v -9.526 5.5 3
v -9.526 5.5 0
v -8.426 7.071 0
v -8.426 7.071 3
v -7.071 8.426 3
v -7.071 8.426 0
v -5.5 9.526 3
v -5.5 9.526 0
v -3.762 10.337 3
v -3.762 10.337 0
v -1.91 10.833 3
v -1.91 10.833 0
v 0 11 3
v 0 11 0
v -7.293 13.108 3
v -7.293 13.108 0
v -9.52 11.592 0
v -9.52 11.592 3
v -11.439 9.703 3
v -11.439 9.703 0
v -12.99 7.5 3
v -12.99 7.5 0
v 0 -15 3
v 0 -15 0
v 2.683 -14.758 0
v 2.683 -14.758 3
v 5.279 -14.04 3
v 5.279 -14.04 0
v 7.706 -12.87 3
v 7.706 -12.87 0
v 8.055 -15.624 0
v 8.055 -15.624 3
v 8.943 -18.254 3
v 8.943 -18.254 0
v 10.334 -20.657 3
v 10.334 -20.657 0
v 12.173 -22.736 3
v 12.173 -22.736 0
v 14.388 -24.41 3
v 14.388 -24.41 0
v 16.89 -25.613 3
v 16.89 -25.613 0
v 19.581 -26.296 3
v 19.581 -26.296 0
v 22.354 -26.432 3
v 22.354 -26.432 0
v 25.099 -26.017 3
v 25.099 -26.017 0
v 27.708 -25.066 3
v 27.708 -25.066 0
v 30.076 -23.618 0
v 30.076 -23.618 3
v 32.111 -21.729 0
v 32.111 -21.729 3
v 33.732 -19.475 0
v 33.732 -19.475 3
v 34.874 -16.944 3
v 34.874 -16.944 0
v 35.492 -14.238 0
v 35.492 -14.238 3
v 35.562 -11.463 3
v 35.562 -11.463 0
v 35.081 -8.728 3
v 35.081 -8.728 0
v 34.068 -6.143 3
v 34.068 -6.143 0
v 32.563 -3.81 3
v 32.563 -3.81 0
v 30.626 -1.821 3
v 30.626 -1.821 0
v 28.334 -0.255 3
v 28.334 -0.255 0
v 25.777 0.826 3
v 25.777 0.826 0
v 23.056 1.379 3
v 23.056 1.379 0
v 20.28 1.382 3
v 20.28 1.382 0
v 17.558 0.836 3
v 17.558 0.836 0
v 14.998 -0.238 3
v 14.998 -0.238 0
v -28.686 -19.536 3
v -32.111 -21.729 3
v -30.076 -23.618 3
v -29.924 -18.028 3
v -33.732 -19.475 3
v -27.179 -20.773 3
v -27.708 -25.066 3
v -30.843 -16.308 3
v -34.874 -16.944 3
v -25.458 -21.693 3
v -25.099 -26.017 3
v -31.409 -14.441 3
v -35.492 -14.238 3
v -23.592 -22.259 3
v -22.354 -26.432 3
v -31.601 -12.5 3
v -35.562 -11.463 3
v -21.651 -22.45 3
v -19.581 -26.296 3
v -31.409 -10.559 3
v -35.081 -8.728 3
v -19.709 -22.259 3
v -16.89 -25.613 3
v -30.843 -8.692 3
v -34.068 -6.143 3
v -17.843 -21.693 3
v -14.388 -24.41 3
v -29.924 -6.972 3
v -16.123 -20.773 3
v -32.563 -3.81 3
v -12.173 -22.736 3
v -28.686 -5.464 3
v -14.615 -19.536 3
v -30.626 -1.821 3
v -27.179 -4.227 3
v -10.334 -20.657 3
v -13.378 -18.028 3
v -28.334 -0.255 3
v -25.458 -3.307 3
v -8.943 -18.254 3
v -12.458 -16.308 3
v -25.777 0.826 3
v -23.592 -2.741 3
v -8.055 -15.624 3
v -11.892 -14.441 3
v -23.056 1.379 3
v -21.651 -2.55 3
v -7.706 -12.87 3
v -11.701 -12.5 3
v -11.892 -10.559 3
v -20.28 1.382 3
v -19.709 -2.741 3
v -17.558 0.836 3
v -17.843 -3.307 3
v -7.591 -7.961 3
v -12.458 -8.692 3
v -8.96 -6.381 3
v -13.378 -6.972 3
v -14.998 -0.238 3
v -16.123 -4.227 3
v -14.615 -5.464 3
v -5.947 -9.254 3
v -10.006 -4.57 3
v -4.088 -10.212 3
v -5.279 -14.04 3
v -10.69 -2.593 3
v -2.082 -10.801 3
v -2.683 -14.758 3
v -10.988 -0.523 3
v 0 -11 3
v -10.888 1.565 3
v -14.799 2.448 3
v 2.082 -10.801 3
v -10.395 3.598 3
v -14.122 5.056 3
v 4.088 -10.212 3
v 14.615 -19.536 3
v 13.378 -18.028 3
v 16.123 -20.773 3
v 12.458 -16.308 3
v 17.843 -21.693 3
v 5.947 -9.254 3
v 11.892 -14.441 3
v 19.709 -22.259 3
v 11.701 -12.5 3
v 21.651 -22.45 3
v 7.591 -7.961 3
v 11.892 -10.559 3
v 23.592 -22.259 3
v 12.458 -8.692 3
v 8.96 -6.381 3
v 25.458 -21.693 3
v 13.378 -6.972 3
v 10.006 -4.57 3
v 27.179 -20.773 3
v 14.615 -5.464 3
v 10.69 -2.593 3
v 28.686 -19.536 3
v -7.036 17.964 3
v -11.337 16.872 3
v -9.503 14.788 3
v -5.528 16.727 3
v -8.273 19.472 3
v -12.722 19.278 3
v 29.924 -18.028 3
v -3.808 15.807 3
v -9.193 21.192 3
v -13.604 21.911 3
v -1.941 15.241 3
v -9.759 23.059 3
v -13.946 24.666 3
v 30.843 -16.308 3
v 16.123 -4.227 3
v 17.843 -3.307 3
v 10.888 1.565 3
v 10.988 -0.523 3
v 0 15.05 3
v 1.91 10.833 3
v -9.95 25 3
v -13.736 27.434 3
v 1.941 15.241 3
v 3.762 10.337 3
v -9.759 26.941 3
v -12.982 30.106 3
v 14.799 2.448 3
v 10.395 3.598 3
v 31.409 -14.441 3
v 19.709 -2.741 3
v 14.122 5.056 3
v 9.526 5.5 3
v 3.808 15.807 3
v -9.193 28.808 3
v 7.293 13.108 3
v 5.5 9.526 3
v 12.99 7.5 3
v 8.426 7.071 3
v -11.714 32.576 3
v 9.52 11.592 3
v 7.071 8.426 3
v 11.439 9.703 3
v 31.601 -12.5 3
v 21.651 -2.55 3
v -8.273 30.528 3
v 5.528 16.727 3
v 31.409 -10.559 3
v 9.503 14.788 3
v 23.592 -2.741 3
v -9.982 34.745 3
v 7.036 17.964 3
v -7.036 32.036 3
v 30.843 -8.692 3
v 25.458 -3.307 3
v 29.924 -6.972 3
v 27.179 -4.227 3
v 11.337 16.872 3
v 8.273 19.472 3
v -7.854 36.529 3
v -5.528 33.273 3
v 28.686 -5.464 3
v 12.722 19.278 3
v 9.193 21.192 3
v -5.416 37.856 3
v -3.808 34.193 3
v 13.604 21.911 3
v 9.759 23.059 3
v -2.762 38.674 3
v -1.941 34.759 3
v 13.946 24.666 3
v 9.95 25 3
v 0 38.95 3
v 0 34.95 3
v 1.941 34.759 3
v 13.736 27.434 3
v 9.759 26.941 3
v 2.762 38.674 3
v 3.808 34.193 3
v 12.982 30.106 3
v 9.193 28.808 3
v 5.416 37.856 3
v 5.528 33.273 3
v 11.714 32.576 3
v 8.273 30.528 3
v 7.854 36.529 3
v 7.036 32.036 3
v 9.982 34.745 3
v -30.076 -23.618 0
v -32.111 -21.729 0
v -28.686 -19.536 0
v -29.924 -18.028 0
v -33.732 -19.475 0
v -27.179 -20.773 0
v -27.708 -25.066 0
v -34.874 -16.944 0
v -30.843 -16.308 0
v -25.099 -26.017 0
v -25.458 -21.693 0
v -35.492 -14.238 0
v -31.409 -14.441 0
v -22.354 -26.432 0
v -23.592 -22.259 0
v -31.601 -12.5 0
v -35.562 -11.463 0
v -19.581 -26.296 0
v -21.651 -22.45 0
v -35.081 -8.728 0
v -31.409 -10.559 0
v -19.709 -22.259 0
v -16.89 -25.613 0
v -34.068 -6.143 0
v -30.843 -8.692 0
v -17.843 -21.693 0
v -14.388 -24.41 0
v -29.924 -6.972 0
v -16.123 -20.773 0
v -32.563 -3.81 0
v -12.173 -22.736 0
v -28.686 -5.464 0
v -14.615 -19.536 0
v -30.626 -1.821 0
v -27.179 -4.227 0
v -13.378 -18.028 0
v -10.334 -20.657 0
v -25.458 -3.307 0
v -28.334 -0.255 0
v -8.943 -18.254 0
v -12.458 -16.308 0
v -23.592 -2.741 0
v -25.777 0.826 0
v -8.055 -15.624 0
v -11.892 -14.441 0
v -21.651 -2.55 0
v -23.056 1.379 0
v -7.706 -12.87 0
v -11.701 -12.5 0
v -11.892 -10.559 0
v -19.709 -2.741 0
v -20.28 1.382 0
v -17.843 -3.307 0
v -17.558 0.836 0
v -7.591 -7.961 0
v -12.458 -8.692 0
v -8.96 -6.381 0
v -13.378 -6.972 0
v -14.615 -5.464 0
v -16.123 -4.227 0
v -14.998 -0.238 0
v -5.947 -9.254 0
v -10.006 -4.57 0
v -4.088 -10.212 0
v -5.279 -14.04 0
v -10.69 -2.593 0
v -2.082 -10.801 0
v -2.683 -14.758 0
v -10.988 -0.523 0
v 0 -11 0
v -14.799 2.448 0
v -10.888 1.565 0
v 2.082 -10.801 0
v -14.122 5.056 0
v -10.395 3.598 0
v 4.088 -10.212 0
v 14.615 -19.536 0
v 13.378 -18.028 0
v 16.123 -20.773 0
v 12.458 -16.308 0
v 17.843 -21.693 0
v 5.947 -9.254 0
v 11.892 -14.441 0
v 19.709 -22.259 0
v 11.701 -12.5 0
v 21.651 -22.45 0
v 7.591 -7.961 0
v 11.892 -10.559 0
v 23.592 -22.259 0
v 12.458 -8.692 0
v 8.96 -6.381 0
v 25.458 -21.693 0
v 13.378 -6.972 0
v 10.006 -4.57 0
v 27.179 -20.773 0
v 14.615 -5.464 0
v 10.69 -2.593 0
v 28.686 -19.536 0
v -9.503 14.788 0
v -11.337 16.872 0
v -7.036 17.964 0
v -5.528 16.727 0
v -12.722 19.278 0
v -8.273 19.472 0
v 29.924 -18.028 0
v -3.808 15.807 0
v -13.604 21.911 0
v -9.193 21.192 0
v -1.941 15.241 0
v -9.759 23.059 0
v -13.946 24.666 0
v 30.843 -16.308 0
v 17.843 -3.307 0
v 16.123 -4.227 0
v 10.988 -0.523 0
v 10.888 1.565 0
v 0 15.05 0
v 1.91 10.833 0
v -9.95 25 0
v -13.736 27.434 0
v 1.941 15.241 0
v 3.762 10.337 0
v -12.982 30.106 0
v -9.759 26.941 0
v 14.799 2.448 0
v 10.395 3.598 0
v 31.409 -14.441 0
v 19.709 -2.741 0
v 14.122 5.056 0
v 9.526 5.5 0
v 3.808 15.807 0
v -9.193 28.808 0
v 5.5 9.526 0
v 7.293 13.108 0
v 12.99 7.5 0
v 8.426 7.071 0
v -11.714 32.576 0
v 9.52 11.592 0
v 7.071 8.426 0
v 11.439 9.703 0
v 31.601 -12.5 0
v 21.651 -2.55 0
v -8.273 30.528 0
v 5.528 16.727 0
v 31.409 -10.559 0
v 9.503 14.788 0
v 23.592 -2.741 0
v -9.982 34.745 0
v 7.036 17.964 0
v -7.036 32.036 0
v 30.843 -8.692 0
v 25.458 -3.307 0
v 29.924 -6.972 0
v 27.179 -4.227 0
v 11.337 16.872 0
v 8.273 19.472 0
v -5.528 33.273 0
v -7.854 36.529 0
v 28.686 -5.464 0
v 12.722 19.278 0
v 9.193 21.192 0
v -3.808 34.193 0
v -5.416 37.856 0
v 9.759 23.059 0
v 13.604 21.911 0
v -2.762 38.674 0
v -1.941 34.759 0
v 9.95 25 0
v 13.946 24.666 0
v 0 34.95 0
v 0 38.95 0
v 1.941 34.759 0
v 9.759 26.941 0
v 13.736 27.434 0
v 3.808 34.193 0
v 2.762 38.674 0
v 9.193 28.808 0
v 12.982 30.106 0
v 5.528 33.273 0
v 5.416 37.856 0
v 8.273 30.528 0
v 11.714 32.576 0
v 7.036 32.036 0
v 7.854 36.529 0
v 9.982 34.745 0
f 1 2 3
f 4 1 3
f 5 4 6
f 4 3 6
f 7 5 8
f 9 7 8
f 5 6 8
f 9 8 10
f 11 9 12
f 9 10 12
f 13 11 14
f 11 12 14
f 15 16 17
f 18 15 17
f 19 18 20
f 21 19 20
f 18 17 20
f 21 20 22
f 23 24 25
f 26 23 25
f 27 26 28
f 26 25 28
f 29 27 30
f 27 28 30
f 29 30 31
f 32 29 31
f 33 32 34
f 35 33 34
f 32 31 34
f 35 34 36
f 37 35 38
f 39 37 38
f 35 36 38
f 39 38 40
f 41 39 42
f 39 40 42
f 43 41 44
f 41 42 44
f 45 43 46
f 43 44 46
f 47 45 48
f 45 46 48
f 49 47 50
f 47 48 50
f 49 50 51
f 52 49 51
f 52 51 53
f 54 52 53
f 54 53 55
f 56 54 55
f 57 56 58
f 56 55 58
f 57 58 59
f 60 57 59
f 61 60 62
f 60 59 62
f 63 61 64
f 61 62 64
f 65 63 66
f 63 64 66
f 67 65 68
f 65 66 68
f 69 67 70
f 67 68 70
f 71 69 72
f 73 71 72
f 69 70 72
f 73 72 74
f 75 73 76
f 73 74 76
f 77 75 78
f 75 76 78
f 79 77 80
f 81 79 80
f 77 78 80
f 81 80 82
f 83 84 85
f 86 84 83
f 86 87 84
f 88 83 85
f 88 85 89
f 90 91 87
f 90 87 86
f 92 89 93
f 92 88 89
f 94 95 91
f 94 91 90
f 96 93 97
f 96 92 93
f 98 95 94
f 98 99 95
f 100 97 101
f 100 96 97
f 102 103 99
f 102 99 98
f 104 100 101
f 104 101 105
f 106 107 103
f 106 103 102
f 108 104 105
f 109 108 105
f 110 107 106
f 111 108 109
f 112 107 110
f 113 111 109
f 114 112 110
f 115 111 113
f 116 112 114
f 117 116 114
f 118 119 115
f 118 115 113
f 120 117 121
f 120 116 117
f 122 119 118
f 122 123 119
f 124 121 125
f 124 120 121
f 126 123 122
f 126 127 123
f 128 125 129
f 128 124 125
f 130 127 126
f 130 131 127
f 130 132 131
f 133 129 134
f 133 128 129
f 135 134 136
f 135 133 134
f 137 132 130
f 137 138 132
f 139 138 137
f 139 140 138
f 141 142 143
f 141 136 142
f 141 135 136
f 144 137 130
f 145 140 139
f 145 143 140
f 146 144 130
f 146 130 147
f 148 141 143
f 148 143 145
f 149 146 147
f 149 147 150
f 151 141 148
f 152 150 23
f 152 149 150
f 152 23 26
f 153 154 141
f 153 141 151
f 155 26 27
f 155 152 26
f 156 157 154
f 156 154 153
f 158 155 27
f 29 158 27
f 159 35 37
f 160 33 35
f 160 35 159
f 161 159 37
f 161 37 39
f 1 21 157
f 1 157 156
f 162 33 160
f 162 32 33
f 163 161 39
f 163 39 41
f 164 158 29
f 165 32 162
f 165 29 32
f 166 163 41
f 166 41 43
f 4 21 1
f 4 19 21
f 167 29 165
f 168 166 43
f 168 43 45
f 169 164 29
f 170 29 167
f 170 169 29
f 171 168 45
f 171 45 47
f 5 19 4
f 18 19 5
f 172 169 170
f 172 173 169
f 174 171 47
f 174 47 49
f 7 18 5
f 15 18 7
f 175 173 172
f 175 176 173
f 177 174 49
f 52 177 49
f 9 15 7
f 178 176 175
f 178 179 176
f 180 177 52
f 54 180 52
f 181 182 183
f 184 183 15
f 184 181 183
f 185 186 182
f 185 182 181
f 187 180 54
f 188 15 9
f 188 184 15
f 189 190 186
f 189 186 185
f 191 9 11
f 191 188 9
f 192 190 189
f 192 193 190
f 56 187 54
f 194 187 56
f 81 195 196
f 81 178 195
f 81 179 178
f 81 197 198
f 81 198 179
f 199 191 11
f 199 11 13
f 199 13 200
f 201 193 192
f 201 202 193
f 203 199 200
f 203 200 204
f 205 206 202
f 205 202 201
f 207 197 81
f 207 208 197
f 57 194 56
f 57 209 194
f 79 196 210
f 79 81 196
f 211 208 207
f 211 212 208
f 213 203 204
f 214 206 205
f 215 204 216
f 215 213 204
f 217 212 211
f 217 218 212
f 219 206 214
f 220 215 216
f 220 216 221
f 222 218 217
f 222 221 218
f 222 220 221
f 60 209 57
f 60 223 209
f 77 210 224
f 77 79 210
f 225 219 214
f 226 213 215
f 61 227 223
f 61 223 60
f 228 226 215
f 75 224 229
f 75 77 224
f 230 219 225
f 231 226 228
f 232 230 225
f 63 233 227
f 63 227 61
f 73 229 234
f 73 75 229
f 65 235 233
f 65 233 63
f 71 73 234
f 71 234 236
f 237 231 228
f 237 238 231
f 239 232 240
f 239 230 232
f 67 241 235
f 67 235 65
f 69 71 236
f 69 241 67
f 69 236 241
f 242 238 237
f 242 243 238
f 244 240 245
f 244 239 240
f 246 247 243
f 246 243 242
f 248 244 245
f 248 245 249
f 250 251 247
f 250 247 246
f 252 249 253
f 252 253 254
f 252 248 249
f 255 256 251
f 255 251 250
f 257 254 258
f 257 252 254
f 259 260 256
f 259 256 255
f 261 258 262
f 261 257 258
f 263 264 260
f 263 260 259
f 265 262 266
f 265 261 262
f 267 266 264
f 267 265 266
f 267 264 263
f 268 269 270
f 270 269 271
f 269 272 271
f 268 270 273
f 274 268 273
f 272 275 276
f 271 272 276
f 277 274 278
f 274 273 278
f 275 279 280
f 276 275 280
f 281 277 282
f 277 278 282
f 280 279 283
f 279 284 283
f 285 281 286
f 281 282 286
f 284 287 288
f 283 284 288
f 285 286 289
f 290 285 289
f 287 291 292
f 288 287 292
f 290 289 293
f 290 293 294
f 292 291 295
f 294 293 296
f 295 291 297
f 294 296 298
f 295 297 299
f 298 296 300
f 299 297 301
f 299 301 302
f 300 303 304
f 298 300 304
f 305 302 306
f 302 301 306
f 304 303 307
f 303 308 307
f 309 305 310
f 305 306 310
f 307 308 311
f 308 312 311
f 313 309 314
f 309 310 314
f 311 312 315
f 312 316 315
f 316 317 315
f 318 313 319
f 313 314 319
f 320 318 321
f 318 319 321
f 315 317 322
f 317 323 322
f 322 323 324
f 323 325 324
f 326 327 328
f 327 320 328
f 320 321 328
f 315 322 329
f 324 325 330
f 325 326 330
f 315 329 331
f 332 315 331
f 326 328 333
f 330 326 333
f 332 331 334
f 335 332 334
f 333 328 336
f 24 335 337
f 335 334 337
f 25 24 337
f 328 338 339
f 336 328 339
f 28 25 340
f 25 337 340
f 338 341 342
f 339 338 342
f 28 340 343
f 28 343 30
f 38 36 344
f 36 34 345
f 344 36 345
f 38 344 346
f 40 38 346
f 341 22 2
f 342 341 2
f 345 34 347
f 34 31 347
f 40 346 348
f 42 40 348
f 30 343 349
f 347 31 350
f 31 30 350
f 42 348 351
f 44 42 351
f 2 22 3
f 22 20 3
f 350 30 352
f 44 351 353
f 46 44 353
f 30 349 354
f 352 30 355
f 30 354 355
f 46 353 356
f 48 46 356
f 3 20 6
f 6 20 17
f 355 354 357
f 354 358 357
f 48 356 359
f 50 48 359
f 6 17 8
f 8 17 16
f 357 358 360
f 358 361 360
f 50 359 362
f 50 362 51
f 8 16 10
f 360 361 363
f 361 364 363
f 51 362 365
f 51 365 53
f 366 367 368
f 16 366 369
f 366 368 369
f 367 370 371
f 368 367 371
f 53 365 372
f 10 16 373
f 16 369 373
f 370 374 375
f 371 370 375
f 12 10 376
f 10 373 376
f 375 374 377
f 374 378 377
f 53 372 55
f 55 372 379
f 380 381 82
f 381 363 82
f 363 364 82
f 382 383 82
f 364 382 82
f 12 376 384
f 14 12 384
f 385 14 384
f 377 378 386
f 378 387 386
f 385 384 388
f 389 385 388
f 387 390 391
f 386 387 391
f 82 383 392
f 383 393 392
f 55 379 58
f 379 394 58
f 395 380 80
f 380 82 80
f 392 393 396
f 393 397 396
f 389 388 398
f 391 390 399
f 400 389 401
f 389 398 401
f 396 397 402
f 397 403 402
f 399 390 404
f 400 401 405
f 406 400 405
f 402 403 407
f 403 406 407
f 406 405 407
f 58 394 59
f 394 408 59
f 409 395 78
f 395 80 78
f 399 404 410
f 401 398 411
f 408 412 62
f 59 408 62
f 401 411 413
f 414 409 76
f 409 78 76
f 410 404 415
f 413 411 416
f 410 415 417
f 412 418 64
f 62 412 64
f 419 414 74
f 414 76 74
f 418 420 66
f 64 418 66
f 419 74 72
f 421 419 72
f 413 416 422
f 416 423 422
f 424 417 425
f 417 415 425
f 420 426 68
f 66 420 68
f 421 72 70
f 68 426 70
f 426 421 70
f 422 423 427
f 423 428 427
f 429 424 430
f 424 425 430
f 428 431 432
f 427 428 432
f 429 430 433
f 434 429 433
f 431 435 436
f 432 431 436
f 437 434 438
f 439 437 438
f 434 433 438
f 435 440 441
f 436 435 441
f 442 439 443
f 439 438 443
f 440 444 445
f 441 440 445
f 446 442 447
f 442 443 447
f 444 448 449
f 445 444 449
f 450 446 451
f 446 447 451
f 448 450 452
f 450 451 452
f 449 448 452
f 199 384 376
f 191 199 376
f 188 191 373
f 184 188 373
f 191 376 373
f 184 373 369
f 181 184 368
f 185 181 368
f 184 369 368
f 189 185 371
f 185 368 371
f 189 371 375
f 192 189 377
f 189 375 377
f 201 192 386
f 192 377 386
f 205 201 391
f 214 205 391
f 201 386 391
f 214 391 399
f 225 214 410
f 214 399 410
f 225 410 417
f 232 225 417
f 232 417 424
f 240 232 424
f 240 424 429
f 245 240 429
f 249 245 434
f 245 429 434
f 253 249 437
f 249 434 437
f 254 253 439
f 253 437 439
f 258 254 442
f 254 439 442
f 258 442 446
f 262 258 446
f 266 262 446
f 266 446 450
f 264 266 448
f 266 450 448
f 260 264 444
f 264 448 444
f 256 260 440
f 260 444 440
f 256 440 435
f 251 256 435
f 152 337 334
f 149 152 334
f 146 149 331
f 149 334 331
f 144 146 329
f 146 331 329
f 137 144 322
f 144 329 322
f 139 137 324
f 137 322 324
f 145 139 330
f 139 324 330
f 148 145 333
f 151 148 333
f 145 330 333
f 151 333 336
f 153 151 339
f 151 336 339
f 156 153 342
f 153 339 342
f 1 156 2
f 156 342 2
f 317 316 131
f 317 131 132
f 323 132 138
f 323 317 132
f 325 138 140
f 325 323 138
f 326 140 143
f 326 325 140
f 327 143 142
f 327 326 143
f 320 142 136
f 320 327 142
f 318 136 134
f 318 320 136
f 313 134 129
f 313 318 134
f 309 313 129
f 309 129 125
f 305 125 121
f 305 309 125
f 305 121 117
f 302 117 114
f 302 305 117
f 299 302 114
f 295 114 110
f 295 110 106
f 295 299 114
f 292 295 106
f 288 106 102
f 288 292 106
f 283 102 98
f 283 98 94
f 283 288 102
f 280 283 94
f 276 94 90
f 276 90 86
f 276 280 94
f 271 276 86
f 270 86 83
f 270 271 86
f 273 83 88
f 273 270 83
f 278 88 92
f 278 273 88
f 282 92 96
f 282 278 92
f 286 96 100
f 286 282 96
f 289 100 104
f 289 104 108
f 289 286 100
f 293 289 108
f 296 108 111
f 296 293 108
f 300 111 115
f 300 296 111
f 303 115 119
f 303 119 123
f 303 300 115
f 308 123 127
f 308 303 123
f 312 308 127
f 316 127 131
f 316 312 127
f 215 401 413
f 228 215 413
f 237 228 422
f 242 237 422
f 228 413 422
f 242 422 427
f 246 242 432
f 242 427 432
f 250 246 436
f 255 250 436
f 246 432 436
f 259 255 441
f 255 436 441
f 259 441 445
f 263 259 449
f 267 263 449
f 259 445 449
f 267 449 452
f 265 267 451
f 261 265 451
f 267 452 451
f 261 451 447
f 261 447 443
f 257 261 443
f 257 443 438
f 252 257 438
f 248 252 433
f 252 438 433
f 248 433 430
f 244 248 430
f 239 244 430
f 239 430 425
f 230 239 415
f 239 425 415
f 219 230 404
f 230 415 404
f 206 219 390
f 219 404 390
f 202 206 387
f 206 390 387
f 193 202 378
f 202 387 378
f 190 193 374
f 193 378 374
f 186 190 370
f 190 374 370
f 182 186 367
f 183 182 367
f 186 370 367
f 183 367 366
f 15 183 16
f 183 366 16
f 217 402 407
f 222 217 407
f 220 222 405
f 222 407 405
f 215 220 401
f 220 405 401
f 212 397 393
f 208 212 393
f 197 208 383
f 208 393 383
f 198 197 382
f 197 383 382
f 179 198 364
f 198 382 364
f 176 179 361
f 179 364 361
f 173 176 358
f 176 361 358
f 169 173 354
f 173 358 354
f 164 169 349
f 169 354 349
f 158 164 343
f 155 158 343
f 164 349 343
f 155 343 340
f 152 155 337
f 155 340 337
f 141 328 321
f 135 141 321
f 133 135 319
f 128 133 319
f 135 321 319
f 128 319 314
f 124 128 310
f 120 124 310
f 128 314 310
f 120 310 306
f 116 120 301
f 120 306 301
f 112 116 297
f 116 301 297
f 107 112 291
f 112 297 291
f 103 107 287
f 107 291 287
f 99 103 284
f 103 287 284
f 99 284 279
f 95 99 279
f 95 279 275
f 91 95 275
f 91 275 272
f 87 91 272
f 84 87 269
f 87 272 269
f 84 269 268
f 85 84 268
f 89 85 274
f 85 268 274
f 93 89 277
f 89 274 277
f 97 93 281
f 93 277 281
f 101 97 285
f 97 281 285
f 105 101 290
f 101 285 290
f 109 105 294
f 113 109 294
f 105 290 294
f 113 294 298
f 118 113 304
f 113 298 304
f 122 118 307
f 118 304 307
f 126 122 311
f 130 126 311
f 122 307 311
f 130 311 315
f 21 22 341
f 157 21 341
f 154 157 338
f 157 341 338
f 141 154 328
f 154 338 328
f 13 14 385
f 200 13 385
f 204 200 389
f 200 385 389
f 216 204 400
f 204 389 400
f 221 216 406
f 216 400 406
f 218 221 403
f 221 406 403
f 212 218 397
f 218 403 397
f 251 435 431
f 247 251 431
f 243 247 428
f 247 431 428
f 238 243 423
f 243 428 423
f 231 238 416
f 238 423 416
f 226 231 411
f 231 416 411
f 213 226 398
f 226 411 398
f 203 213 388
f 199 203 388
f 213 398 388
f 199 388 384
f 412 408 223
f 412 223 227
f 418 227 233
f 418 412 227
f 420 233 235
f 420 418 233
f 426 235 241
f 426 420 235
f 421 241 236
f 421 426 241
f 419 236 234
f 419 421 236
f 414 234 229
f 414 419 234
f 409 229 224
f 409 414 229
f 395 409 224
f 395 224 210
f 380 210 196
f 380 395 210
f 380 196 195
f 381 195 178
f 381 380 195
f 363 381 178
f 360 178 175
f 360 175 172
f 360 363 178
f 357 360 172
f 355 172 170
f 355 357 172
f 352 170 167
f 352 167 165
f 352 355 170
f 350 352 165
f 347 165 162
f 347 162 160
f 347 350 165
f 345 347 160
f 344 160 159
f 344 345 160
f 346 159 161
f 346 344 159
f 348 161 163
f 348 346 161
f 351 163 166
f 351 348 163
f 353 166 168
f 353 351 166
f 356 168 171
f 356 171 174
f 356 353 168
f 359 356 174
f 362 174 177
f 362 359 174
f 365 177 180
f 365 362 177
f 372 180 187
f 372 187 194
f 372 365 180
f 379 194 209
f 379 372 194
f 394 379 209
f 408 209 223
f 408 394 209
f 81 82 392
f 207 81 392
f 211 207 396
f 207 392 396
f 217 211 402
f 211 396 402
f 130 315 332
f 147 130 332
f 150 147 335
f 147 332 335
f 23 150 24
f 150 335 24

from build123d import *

# Parameters (mm, degrees)
F0_R     = 9.95
F1_DEPTH = 3


with BuildPart() as f1:
    # F0 (on Top) → F1 (new body)
    with BuildSketch(Plane.XY):
        with BuildLine():
            ThreePointArc((7.292575, 13.10795), (0, 38.95), (-7.292575, 13.10795))
            ThreePointArc((-7.292575, 13.10795), (-10.52197, 10.690564), (-12.990381, 7.5))
            ThreePointArc((-12.990381, 7.5), (-14.519285, 3.767011), (-14.998105, -0.23842))
            ThreePointArc((-14.998105, -0.23842), (-33.731689, -19.475), (-7.70553, -12.86953))
            ThreePointArc((-7.70553, -12.86953), (-3.997315, -14.457575), (0, -15))
            ThreePointArc((0, -15), (3.997315, -14.457575), (7.70553, -12.86953))
            ThreePointArc((7.70553, -12.86953), (33.731689, -19.475), (14.998105, -0.23842))
            ThreePointArc((14.998105, -0.23842), (14.519285, 3.767011), (12.990381, 7.5))
            ThreePointArc((12.990381, 7.5), (10.52197, 10.690564), (7.292575, 13.10795))
        make_face()
        with Locations((-21.650635, -12.5)):
            Circle(F0_R, mode=Mode.SUBTRACT)
        with Locations((21.650635, -12.5)):
            Circle(F0_R, mode=Mode.SUBTRACT)
        with BuildLine():
            ThreePointArc((0, 11), (5.5, 9.526279), (9.526279, 5.5))
            ThreePointArc((9.526279, 5.5), (9.526279, -5.5), (0, -11))
            ThreePointArc((0, -11), (-9.526279, -5.5), (-9.526279, 5.5))
            ThreePointArc((-9.526279, 5.5), (-5.5, 9.526279), (0, 11))
        make_face(mode=Mode.SUBTRACT)
        with BuildLine():
            ThreePointArc((9.95, 25), (7.035712, 17.964288), (0, 15.05))
            ThreePointArc((0, 15.05), (-7.035712, 32.035712), (9.95, 25))
        make_face(mode=Mode.SUBTRACT)
    extrude(amount=F1_DEPTH)


solid = f1.part
